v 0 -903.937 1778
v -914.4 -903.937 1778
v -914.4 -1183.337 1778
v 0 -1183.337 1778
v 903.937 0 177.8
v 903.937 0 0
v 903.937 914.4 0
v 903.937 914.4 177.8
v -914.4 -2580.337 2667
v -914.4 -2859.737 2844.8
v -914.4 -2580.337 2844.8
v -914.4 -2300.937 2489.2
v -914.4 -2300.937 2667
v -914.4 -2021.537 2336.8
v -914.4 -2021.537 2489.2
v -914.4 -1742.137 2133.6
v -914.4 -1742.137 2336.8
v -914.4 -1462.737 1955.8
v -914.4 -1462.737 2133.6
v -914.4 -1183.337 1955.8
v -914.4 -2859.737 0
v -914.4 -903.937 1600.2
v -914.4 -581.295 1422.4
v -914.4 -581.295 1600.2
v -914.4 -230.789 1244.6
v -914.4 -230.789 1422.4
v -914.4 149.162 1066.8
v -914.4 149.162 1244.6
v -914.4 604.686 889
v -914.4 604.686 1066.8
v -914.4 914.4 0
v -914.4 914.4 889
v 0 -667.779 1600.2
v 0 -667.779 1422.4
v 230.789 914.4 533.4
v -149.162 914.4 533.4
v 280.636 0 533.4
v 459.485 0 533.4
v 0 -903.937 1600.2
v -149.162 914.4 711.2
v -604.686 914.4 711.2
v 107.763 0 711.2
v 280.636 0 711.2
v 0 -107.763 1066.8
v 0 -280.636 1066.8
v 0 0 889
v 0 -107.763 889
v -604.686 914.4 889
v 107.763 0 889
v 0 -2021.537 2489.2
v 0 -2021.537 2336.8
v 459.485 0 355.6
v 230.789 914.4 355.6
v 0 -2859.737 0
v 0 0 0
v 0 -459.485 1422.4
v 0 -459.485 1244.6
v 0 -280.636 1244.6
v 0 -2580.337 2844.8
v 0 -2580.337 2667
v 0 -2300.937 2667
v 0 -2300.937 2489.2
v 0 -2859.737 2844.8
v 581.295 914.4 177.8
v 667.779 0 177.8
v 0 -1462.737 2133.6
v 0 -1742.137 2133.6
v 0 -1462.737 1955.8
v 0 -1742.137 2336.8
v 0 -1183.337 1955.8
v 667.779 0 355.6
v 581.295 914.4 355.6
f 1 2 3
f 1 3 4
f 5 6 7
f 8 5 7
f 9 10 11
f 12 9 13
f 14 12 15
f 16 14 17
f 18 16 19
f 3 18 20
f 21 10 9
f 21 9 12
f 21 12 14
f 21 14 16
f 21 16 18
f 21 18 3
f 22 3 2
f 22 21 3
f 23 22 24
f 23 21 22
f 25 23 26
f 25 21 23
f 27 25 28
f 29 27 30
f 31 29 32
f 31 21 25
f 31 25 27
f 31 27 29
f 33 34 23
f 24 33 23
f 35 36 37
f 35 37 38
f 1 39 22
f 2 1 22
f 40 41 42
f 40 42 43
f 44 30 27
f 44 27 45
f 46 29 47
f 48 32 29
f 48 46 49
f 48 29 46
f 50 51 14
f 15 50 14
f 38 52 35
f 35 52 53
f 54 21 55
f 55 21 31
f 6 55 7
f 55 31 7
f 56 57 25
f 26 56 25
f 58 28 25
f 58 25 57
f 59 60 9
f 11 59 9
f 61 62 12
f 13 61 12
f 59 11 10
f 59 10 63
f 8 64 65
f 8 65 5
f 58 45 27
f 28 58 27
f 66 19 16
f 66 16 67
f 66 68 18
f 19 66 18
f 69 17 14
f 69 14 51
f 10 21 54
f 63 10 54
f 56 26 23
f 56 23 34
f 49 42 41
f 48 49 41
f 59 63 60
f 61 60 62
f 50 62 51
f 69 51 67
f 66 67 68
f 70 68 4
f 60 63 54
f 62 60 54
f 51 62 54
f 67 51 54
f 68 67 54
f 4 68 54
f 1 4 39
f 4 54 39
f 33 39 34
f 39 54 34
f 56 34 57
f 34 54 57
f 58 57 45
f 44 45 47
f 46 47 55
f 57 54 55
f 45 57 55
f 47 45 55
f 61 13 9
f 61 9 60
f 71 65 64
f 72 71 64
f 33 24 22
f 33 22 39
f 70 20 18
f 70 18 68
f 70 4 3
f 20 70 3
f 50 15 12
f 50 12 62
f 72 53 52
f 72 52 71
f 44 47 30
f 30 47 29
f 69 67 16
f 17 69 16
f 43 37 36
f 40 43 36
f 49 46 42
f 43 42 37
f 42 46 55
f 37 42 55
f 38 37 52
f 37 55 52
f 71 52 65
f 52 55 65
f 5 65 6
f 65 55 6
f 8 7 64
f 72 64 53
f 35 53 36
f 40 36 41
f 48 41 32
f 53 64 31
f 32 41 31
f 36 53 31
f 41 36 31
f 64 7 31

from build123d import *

# Parameters (mm, degrees)
F1_DEPTH  = 177.8
F2_DEPTH  = 355.6
F3_DEPTH  = 533.4
F4_DEPTH  = 711.2
F5_DEPTH  = 889
F6_DEPTH  = 1066.8
F7_DEPTH  = 1244.6
F8_DEPTH  = 1422.4
F9_DEPTH  = 1600.2
F0_W      = 457.2
F0_H      = 279.4
F10_DEPTH = 1778
F11_DEPTH = 1955.8
F12_DEPTH = 2133.6
F13_DEPTH = 2336.8
F14_DEPTH = 2489.2
F15_DEPTH = 2667
F16_DEPTH = 2844.8


with BuildPart() as f1:
    # F0 (on Top) → F1 (new body)
    with BuildSketch(Plane.XY):
        Polygon((581.2949443458, 914.4), (624.5369894972, 457.2), (903.9369894972, 457.2), (903.9369894972, 914.4), align=None)
        Polygon((903.9369894972, 457.2), (624.5369894972, 457.2), (667.7790346486, 0), (903.9369894972, 0), align=None)
    extrude(amount=F1_DEPTH)

    # F0 (on Top) → F2 (join)
    with BuildSketch(Plane.XY):
        Polygon((230.7885144347, 914.4), (345.1369894972, 457.2), (624.5369894972, 457.2), (581.2949443458, 914.4), align=None)
        Polygon((624.5369894972, 457.2), (345.1369894972, 457.2), (459.4854645597, 0), (667.7790346486, 0), align=None)
    extrude(amount=F2_DEPTH)

    # F0 (on Top) → F3 (join)
    with BuildSketch(Plane.XY):
        Polygon((-149.1616126291, 914.4), (65.7369894972, 457.2), (345.1369894972, 457.2), (230.7885144347, 914.4), align=None)
        Polygon((345.1369894972, 457.2), (65.7369894972, 457.2), (280.6355916235, 0), (459.4854645597, 0), align=None)
    extrude(amount=F3_DEPTH)

    # F0 (on Top) → F4 (join)
    with BuildSketch(Plane.XY):
        with BuildLine():
            ThreePointArc((-209.0448536142, 406.6104882777), (-107.5395851755, 444.3726787509), (0, 457.2))
            Line((0, 457.2), (65.7369894972, 457.2))
            Line((65.7369894972, 457.2), (-149.1616126291, 914.4))
            Line((-149.1616126291, 914.4), (-604.6857611484, 914.4))
            Line((-604.6857611484, 914.4), (-209.0448536142, 406.6104882777))
        make_face()
        with BuildLine():
            Line((65.7369894972, 457.2), (0, 457.2))
            ThreePointArc((0, 457.2), (-107.5395851755, 444.3726787509), (-209.0448536142, 406.6104882777))
            Line((-209.0448536142, 406.6104882777), (107.7630734528, 0))
            Line((107.7630734528, 0), (280.6355916235, 0))
            Line((280.6355916235, 0), (65.7369894972, 457.2))
        make_face()
    extrude(amount=F4_DEPTH)

    # F0 (on Top) → F5 (join)
    with BuildSketch(Plane.XY):
        with BuildLine():
            ThreePointArc((-323.2892203585, 323.2892203585), (-269.4076836321, 369.3932051351), (-209.0448536142, 406.6104882777))
            Line((-209.0448536142, 406.6104882777), (-604.6857611484, 914.4))
            Line((-604.6857611484, 914.4), (-914.4, 914.4))
            Line((-914.4, 914.4), (-323.2892203585, 323.2892203585))
        make_face()
        with BuildLine():
            Line((107.7630734528, 0), (-209.0448536142, 406.6104882777))
            ThreePointArc((-209.0448536142, 406.6104882777), (-269.4076836321, 369.3932051351), (-323.2892203585, 323.2892203585))
            Line((-323.2892203585, 323.2892203585), (0, 0))
            Line((0, 0), (107.7630734528, 0))
        make_face()
        with BuildLine():
            ThreePointArc((-406.6104882777, 209.0448536142), (-369.3932051351, 269.4076836321), (-323.2892203585, 323.2892203585))
            Line((-323.2892203585, 323.2892203585), (-914.4, 914.4))
            Line((-914.4, 914.4), (-914.4, 604.6857611484))
            Line((-914.4, 604.6857611484), (-406.6104882777, 209.0448536142))
        make_face()
        with BuildLine():
            Line((0, 0), (-323.2892203585, 323.2892203585))
            ThreePointArc((-323.2892203585, 323.2892203585), (-369.3932051351, 269.4076836321), (-406.6104882777, 209.0448536142))
            Line((-406.6104882777, 209.0448536142), (0, -107.7630734528))
            Line((0, -107.7630734528), (0, 0))
        make_face()
    extrude(amount=F5_DEPTH)

    # F0 (on Top) → F6 (join)
    with BuildSketch(Plane.XY):
        with BuildLine():
            ThreePointArc((-457.2, 0), (-444.3726787509, 107.5395851755), (-406.6104882777, 209.0448536142))
            Line((-406.6104882777, 209.0448536142), (-914.4, 604.6857611484))
            Line((-914.4, 604.6857611484), (-914.4, 149.1616126291))
            Line((-914.4, 149.1616126291), (-457.2, -65.7369894972))
            Line((-457.2, -65.7369894972), (-457.2, 0))
        make_face()
        with BuildLine():
            Line((0, -107.7630734528), (-406.6104882777, 209.0448536142))
            ThreePointArc((-406.6104882777, 209.0448536142), (-444.3726787509, 107.5395851755), (-457.2, 0))
            Line((-457.2, 0), (-457.2, -65.7369894972))
            Line((-457.2, -65.7369894972), (0, -280.6355916235))
            Line((0, -280.6355916235), (0, -107.7630734528))
        make_face()
    extrude(amount=F6_DEPTH)

    # F0 (on Top) → F7 (join)
    with BuildSketch(Plane.XY):
        Polygon((-457.2, -345.1369894972), (-457.2, -65.7369894972), (-914.4, 149.1616126291), (-914.4, -230.7885144347), align=None)
        Polygon((0, -280.6355916235), (-457.2, -65.7369894972), (-457.2, -345.1369894972), (0, -459.4854645597), align=None)
    extrude(amount=F7_DEPTH)

    # F0 (on Top) → F8 (join)
    with BuildSketch(Plane.XY):
        Polygon((-457.2, -624.5369894972), (-457.2, -345.1369894972), (-914.4, -230.7885144347), (-914.4, -581.2949443458), align=None)
        Polygon((0, -459.4854645597), (-457.2, -345.1369894972), (-457.2, -624.5369894972), (0, -667.7790346486), align=None)
    extrude(amount=F8_DEPTH)

    # F0 (on Top) → F9 (join)
    with BuildSketch(Plane.XY):
        Polygon((-457.2, -903.9369894972), (-457.2, -624.5369894972), (-914.4, -581.2949443458), (-914.4, -903.9369894972), align=None)
        Polygon((0, -667.7790346486), (-457.2, -624.5369894972), (-457.2, -903.9369894972), (0, -903.9369894972), align=None)
    extrude(amount=F9_DEPTH)

    # F0 (on Top) → F10 (join)
    with BuildSketch(Plane.XY):
        with Locations((-685.8, -1043.6369894972)):
            Rectangle(F0_W, F0_H)
        with Locations((-228.6, -1043.6369894972)):
            Rectangle(F0_W, F0_H)
    extrude(amount=F10_DEPTH)

    # F0 (on Top) → F11 (join)
    with BuildSketch(Plane.XY):
        with Locations((-685.8, -1323.0369894972)):
            Rectangle(F0_W, F0_H)
        with Locations((-228.6, -1323.0369894972)):
            Rectangle(F0_W, F0_H)
    extrude(amount=F11_DEPTH)

    # F0 (on Top) → F12 (join)
    with BuildSketch(Plane.XY):
        with Locations((-685.8, -1602.4369894972)):
            Rectangle(F0_W, F0_H)
        with Locations((-228.6, -1602.4369894972)):
            Rectangle(F0_W, F0_H)
    extrude(amount=F12_DEPTH)

    # F0 (on Top) → F13 (join)
    with BuildSketch(Plane.XY):
        with Locations((-685.8, -1881.8369894972)):
            Rectangle(F0_W, F0_H)
        with Locations((-228.6, -1881.8369894972)):
            Rectangle(F0_W, F0_H)
    extrude(amount=F13_DEPTH)

    # F0 (on Top) → F14 (join)
    with BuildSketch(Plane.XY):
        with Locations((-685.8, -2161.2369894972)):
            Rectangle(F0_W, F0_H)
        with Locations((-228.6, -2161.2369894972)):
            Rectangle(F0_W, F0_H)
    extrude(amount=F14_DEPTH)

    # F0 (on Top) → F15 (join)
    with BuildSketch(Plane.XY):
        with Locations((-685.8, -2440.6369894972)):
            Rectangle(F0_W, F0_H)
        with Locations((-228.6, -2440.6369894972)):
            Rectangle(F0_W, F0_H)
    extrude(amount=F15_DEPTH)

    # F0 (on Top) → F16 (join)
    with BuildSketch(Plane.XY):
        with Locations((-685.8, -2720.0369894972)):
            Rectangle(F0_W, F0_H)
        with Locations((-228.6, -2720.0369894972)):
            Rectangle(F0_W, F0_H)
    extrude(amount=F16_DEPTH)


solid = f1.part
